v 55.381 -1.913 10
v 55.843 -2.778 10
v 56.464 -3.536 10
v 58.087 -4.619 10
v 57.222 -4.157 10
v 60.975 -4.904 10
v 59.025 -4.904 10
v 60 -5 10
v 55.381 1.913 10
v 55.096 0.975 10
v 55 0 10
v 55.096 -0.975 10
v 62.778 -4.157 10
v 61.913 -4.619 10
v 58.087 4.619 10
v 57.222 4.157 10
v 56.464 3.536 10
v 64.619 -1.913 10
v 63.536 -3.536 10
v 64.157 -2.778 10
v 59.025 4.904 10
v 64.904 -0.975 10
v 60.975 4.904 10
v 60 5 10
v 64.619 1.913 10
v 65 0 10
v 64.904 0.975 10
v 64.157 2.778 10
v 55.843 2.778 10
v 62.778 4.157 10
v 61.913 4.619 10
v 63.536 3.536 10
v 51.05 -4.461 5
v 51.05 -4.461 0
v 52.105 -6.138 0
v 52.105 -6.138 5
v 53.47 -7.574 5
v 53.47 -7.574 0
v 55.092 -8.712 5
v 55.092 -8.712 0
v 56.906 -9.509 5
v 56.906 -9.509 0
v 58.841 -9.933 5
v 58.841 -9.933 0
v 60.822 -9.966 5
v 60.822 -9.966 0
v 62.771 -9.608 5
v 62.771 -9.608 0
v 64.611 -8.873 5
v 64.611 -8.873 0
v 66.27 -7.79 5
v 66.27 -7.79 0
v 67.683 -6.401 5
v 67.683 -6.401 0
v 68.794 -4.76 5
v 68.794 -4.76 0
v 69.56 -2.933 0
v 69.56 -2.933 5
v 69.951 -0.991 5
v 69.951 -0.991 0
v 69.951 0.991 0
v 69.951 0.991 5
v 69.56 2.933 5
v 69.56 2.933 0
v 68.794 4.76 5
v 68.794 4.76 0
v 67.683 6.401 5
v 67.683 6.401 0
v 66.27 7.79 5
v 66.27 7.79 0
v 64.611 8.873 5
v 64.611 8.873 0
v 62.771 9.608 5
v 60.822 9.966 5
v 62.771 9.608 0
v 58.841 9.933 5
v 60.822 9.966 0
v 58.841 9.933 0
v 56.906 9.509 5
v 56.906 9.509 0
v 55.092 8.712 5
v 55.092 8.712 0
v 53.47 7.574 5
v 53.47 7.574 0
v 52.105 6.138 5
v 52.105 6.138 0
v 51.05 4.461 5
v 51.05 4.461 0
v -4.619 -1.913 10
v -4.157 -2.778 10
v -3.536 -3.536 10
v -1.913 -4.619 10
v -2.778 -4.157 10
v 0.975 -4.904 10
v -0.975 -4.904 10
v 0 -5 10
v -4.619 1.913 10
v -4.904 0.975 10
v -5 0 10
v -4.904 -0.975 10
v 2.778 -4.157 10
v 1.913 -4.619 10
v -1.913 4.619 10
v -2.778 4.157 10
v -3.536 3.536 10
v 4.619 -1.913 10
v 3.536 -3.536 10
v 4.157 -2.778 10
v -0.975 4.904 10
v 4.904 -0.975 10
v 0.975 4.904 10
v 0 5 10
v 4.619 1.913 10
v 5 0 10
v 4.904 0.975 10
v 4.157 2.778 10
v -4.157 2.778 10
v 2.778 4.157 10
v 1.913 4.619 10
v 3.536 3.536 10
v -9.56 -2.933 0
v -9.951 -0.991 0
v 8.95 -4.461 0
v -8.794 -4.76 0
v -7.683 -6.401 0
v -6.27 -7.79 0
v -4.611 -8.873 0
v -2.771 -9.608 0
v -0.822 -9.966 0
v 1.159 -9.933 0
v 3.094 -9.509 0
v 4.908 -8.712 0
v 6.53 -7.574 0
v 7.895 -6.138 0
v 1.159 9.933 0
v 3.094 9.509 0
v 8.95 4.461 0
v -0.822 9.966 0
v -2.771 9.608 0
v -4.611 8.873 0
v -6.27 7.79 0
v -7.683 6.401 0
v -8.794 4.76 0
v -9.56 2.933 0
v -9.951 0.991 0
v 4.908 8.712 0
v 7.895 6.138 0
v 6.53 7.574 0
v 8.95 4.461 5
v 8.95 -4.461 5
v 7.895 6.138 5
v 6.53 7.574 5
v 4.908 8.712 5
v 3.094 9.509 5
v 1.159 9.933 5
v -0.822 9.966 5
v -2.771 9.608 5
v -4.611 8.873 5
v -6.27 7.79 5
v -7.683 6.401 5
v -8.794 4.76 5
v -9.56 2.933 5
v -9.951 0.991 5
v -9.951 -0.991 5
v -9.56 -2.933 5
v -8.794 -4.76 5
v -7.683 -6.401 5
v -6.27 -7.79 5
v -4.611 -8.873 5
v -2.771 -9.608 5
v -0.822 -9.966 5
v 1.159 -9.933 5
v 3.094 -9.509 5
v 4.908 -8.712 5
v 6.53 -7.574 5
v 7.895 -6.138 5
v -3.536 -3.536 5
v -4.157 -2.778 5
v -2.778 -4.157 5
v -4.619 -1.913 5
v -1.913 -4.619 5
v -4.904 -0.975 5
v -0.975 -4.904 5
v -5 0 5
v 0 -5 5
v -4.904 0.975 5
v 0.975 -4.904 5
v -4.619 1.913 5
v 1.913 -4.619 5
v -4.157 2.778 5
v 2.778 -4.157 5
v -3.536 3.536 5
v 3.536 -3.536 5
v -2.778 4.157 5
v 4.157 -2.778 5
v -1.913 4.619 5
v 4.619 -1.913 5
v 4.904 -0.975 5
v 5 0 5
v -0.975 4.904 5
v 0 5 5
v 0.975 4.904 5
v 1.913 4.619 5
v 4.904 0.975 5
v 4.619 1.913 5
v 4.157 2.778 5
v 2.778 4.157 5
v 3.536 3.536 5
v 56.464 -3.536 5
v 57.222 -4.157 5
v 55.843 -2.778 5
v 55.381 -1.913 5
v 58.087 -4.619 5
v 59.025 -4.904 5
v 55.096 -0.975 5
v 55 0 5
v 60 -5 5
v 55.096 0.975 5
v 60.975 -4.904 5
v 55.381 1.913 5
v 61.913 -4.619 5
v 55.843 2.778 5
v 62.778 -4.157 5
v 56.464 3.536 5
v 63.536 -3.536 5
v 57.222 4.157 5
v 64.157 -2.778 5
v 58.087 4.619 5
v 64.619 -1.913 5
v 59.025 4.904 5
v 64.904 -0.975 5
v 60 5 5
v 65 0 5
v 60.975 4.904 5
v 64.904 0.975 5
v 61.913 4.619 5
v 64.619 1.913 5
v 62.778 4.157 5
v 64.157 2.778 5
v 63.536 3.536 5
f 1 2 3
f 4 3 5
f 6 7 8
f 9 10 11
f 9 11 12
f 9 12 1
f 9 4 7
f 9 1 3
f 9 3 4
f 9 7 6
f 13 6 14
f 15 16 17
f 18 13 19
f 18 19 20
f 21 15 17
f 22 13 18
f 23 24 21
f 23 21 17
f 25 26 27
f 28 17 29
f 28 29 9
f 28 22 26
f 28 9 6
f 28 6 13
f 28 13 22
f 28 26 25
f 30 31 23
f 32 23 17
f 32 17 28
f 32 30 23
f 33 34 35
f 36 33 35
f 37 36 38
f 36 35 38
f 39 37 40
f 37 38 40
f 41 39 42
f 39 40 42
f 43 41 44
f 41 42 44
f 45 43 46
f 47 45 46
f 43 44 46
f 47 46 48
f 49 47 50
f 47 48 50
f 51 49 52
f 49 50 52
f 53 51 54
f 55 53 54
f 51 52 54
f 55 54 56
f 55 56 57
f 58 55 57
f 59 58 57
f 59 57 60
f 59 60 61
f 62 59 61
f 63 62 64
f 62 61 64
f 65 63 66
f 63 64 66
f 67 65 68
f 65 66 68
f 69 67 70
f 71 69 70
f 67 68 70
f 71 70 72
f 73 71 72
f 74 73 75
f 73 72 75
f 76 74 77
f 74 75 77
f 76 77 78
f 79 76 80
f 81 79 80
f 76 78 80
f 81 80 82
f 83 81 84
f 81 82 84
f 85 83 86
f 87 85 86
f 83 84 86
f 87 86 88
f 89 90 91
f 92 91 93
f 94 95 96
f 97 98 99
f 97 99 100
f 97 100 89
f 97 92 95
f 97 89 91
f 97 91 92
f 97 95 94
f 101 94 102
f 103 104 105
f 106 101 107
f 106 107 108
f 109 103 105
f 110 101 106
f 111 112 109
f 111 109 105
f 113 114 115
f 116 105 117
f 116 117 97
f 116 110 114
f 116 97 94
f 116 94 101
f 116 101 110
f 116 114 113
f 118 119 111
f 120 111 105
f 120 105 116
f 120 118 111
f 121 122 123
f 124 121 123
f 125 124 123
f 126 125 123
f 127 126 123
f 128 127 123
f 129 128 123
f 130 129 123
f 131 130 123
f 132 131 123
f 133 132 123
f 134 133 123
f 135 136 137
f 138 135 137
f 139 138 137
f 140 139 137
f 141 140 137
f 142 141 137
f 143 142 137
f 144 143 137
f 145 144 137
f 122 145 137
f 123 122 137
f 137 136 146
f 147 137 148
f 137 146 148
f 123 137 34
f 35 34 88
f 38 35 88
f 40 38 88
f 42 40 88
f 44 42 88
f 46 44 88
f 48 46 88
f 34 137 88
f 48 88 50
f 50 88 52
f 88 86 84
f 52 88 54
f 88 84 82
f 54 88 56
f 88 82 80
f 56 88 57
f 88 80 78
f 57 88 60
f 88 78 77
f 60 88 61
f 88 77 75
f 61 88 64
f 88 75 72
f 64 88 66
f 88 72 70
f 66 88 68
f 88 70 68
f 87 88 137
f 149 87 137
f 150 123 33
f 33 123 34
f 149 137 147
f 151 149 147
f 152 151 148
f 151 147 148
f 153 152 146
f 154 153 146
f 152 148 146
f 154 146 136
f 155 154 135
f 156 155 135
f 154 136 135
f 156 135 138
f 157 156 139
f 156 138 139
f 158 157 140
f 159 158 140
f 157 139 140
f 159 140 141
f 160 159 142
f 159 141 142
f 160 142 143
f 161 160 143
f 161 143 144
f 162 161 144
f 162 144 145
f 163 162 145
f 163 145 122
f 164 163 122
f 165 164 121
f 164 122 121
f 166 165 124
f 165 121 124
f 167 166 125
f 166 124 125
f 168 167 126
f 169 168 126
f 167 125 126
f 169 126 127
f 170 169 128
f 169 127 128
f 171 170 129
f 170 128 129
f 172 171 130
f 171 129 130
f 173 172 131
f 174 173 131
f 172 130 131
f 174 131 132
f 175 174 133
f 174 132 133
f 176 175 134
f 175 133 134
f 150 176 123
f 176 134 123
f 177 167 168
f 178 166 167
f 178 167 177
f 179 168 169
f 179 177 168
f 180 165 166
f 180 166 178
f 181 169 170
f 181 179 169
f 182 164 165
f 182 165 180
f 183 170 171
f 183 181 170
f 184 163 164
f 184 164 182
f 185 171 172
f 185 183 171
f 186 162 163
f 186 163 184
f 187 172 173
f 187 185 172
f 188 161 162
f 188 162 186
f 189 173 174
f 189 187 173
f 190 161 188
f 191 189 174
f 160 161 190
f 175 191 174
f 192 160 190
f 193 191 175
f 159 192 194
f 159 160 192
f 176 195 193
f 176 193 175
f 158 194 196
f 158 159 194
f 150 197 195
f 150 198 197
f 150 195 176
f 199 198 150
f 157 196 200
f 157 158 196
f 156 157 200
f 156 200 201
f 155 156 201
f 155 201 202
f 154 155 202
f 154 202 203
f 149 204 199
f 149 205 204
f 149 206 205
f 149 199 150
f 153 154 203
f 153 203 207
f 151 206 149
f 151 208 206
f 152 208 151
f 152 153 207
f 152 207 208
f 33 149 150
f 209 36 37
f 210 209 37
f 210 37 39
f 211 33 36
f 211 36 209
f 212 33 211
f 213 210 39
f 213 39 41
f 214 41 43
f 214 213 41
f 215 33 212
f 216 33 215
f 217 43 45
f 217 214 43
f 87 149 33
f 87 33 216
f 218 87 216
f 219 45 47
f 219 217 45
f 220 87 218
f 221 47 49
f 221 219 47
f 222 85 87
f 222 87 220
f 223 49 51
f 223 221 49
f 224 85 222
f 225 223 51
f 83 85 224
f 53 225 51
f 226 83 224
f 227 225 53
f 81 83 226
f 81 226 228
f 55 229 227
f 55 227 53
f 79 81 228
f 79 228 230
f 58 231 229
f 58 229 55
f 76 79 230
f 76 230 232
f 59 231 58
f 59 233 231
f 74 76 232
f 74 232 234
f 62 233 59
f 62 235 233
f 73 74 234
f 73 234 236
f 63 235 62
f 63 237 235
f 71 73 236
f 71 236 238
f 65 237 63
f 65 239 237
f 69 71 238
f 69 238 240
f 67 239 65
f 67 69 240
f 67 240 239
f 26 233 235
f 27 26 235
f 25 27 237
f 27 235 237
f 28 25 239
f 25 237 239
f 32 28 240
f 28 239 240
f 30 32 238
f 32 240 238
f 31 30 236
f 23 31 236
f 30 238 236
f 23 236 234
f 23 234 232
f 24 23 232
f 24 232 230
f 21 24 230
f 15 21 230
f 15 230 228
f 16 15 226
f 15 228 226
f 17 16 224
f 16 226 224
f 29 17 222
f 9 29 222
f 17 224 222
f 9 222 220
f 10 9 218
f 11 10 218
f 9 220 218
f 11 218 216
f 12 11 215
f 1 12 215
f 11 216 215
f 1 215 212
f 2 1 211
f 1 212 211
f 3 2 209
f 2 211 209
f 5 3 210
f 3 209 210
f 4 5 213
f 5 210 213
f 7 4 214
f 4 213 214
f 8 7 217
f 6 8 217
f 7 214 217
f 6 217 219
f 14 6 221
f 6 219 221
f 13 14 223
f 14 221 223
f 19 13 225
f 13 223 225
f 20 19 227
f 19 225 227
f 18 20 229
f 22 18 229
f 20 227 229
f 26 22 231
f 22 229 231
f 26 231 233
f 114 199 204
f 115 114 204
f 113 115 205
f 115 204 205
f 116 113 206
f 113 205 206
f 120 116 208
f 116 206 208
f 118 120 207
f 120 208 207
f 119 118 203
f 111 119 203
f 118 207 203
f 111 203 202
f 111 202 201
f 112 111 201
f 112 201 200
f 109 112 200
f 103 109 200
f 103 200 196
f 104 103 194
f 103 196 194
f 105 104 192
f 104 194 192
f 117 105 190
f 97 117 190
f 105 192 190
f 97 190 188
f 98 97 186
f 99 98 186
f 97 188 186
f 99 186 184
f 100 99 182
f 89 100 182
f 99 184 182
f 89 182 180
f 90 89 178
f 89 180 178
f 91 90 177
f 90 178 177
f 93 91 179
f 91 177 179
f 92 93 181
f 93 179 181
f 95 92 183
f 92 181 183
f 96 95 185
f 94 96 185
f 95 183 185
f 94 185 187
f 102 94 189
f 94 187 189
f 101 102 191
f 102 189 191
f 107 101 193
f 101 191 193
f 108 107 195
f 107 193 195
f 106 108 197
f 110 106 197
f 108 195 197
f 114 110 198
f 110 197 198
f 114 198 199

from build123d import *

# Parameters (mm, degrees)
SKETCH_1_R      = 10
EXTRUDE_3_DEPTH = 5
SKETCH_3_R      = 5
EXTRUDE_4_DEPTH = 5
SKETCH_4_R      = 5
EXTRUDE_5_DEPTH = 5


with BuildPart() as part:
    # 草图1 → 凸台-拉伸3 (new body)
    with BuildSketch(Plane.XY):
        Circle(SKETCH_1_R)
        with BuildLine():
            Line((51.049932735, 4.46052642), (8.950067265, 4.46052642))
            ThreePointArc((8.950067265, 4.46052642), (9.733978443, 2.291214454), (10, 0))
            ThreePointArc((10, 0), (9.733978443, -2.291214454), (8.950067265, -4.46052642))
            Line((8.950067265, -4.46052642), (51.049932735, -4.46052642))
            ThreePointArc((51.049932735, -4.46052642), (50, 0), (51.049932735, 4.46052642))
        make_face()
        with Locations((60, 0)):
            Circle(SKETCH_1_R)
    extrude(amount=EXTRUDE_3_DEPTH)

    # 草图3 → 凸台-拉伸4 (add)
    with BuildSketch(Plane.XY.offset(5)):
        with Locations((60, 0)):
            Circle(SKETCH_3_R)
    extrude(amount=EXTRUDE_4_DEPTH)

    # 草图4 → 凸台-拉伸5 (add)
    with BuildSketch(Plane.XY.offset(5)):
        Circle(SKETCH_4_R)
    extrude(amount=EXTRUDE_5_DEPTH)


solid = part.part
